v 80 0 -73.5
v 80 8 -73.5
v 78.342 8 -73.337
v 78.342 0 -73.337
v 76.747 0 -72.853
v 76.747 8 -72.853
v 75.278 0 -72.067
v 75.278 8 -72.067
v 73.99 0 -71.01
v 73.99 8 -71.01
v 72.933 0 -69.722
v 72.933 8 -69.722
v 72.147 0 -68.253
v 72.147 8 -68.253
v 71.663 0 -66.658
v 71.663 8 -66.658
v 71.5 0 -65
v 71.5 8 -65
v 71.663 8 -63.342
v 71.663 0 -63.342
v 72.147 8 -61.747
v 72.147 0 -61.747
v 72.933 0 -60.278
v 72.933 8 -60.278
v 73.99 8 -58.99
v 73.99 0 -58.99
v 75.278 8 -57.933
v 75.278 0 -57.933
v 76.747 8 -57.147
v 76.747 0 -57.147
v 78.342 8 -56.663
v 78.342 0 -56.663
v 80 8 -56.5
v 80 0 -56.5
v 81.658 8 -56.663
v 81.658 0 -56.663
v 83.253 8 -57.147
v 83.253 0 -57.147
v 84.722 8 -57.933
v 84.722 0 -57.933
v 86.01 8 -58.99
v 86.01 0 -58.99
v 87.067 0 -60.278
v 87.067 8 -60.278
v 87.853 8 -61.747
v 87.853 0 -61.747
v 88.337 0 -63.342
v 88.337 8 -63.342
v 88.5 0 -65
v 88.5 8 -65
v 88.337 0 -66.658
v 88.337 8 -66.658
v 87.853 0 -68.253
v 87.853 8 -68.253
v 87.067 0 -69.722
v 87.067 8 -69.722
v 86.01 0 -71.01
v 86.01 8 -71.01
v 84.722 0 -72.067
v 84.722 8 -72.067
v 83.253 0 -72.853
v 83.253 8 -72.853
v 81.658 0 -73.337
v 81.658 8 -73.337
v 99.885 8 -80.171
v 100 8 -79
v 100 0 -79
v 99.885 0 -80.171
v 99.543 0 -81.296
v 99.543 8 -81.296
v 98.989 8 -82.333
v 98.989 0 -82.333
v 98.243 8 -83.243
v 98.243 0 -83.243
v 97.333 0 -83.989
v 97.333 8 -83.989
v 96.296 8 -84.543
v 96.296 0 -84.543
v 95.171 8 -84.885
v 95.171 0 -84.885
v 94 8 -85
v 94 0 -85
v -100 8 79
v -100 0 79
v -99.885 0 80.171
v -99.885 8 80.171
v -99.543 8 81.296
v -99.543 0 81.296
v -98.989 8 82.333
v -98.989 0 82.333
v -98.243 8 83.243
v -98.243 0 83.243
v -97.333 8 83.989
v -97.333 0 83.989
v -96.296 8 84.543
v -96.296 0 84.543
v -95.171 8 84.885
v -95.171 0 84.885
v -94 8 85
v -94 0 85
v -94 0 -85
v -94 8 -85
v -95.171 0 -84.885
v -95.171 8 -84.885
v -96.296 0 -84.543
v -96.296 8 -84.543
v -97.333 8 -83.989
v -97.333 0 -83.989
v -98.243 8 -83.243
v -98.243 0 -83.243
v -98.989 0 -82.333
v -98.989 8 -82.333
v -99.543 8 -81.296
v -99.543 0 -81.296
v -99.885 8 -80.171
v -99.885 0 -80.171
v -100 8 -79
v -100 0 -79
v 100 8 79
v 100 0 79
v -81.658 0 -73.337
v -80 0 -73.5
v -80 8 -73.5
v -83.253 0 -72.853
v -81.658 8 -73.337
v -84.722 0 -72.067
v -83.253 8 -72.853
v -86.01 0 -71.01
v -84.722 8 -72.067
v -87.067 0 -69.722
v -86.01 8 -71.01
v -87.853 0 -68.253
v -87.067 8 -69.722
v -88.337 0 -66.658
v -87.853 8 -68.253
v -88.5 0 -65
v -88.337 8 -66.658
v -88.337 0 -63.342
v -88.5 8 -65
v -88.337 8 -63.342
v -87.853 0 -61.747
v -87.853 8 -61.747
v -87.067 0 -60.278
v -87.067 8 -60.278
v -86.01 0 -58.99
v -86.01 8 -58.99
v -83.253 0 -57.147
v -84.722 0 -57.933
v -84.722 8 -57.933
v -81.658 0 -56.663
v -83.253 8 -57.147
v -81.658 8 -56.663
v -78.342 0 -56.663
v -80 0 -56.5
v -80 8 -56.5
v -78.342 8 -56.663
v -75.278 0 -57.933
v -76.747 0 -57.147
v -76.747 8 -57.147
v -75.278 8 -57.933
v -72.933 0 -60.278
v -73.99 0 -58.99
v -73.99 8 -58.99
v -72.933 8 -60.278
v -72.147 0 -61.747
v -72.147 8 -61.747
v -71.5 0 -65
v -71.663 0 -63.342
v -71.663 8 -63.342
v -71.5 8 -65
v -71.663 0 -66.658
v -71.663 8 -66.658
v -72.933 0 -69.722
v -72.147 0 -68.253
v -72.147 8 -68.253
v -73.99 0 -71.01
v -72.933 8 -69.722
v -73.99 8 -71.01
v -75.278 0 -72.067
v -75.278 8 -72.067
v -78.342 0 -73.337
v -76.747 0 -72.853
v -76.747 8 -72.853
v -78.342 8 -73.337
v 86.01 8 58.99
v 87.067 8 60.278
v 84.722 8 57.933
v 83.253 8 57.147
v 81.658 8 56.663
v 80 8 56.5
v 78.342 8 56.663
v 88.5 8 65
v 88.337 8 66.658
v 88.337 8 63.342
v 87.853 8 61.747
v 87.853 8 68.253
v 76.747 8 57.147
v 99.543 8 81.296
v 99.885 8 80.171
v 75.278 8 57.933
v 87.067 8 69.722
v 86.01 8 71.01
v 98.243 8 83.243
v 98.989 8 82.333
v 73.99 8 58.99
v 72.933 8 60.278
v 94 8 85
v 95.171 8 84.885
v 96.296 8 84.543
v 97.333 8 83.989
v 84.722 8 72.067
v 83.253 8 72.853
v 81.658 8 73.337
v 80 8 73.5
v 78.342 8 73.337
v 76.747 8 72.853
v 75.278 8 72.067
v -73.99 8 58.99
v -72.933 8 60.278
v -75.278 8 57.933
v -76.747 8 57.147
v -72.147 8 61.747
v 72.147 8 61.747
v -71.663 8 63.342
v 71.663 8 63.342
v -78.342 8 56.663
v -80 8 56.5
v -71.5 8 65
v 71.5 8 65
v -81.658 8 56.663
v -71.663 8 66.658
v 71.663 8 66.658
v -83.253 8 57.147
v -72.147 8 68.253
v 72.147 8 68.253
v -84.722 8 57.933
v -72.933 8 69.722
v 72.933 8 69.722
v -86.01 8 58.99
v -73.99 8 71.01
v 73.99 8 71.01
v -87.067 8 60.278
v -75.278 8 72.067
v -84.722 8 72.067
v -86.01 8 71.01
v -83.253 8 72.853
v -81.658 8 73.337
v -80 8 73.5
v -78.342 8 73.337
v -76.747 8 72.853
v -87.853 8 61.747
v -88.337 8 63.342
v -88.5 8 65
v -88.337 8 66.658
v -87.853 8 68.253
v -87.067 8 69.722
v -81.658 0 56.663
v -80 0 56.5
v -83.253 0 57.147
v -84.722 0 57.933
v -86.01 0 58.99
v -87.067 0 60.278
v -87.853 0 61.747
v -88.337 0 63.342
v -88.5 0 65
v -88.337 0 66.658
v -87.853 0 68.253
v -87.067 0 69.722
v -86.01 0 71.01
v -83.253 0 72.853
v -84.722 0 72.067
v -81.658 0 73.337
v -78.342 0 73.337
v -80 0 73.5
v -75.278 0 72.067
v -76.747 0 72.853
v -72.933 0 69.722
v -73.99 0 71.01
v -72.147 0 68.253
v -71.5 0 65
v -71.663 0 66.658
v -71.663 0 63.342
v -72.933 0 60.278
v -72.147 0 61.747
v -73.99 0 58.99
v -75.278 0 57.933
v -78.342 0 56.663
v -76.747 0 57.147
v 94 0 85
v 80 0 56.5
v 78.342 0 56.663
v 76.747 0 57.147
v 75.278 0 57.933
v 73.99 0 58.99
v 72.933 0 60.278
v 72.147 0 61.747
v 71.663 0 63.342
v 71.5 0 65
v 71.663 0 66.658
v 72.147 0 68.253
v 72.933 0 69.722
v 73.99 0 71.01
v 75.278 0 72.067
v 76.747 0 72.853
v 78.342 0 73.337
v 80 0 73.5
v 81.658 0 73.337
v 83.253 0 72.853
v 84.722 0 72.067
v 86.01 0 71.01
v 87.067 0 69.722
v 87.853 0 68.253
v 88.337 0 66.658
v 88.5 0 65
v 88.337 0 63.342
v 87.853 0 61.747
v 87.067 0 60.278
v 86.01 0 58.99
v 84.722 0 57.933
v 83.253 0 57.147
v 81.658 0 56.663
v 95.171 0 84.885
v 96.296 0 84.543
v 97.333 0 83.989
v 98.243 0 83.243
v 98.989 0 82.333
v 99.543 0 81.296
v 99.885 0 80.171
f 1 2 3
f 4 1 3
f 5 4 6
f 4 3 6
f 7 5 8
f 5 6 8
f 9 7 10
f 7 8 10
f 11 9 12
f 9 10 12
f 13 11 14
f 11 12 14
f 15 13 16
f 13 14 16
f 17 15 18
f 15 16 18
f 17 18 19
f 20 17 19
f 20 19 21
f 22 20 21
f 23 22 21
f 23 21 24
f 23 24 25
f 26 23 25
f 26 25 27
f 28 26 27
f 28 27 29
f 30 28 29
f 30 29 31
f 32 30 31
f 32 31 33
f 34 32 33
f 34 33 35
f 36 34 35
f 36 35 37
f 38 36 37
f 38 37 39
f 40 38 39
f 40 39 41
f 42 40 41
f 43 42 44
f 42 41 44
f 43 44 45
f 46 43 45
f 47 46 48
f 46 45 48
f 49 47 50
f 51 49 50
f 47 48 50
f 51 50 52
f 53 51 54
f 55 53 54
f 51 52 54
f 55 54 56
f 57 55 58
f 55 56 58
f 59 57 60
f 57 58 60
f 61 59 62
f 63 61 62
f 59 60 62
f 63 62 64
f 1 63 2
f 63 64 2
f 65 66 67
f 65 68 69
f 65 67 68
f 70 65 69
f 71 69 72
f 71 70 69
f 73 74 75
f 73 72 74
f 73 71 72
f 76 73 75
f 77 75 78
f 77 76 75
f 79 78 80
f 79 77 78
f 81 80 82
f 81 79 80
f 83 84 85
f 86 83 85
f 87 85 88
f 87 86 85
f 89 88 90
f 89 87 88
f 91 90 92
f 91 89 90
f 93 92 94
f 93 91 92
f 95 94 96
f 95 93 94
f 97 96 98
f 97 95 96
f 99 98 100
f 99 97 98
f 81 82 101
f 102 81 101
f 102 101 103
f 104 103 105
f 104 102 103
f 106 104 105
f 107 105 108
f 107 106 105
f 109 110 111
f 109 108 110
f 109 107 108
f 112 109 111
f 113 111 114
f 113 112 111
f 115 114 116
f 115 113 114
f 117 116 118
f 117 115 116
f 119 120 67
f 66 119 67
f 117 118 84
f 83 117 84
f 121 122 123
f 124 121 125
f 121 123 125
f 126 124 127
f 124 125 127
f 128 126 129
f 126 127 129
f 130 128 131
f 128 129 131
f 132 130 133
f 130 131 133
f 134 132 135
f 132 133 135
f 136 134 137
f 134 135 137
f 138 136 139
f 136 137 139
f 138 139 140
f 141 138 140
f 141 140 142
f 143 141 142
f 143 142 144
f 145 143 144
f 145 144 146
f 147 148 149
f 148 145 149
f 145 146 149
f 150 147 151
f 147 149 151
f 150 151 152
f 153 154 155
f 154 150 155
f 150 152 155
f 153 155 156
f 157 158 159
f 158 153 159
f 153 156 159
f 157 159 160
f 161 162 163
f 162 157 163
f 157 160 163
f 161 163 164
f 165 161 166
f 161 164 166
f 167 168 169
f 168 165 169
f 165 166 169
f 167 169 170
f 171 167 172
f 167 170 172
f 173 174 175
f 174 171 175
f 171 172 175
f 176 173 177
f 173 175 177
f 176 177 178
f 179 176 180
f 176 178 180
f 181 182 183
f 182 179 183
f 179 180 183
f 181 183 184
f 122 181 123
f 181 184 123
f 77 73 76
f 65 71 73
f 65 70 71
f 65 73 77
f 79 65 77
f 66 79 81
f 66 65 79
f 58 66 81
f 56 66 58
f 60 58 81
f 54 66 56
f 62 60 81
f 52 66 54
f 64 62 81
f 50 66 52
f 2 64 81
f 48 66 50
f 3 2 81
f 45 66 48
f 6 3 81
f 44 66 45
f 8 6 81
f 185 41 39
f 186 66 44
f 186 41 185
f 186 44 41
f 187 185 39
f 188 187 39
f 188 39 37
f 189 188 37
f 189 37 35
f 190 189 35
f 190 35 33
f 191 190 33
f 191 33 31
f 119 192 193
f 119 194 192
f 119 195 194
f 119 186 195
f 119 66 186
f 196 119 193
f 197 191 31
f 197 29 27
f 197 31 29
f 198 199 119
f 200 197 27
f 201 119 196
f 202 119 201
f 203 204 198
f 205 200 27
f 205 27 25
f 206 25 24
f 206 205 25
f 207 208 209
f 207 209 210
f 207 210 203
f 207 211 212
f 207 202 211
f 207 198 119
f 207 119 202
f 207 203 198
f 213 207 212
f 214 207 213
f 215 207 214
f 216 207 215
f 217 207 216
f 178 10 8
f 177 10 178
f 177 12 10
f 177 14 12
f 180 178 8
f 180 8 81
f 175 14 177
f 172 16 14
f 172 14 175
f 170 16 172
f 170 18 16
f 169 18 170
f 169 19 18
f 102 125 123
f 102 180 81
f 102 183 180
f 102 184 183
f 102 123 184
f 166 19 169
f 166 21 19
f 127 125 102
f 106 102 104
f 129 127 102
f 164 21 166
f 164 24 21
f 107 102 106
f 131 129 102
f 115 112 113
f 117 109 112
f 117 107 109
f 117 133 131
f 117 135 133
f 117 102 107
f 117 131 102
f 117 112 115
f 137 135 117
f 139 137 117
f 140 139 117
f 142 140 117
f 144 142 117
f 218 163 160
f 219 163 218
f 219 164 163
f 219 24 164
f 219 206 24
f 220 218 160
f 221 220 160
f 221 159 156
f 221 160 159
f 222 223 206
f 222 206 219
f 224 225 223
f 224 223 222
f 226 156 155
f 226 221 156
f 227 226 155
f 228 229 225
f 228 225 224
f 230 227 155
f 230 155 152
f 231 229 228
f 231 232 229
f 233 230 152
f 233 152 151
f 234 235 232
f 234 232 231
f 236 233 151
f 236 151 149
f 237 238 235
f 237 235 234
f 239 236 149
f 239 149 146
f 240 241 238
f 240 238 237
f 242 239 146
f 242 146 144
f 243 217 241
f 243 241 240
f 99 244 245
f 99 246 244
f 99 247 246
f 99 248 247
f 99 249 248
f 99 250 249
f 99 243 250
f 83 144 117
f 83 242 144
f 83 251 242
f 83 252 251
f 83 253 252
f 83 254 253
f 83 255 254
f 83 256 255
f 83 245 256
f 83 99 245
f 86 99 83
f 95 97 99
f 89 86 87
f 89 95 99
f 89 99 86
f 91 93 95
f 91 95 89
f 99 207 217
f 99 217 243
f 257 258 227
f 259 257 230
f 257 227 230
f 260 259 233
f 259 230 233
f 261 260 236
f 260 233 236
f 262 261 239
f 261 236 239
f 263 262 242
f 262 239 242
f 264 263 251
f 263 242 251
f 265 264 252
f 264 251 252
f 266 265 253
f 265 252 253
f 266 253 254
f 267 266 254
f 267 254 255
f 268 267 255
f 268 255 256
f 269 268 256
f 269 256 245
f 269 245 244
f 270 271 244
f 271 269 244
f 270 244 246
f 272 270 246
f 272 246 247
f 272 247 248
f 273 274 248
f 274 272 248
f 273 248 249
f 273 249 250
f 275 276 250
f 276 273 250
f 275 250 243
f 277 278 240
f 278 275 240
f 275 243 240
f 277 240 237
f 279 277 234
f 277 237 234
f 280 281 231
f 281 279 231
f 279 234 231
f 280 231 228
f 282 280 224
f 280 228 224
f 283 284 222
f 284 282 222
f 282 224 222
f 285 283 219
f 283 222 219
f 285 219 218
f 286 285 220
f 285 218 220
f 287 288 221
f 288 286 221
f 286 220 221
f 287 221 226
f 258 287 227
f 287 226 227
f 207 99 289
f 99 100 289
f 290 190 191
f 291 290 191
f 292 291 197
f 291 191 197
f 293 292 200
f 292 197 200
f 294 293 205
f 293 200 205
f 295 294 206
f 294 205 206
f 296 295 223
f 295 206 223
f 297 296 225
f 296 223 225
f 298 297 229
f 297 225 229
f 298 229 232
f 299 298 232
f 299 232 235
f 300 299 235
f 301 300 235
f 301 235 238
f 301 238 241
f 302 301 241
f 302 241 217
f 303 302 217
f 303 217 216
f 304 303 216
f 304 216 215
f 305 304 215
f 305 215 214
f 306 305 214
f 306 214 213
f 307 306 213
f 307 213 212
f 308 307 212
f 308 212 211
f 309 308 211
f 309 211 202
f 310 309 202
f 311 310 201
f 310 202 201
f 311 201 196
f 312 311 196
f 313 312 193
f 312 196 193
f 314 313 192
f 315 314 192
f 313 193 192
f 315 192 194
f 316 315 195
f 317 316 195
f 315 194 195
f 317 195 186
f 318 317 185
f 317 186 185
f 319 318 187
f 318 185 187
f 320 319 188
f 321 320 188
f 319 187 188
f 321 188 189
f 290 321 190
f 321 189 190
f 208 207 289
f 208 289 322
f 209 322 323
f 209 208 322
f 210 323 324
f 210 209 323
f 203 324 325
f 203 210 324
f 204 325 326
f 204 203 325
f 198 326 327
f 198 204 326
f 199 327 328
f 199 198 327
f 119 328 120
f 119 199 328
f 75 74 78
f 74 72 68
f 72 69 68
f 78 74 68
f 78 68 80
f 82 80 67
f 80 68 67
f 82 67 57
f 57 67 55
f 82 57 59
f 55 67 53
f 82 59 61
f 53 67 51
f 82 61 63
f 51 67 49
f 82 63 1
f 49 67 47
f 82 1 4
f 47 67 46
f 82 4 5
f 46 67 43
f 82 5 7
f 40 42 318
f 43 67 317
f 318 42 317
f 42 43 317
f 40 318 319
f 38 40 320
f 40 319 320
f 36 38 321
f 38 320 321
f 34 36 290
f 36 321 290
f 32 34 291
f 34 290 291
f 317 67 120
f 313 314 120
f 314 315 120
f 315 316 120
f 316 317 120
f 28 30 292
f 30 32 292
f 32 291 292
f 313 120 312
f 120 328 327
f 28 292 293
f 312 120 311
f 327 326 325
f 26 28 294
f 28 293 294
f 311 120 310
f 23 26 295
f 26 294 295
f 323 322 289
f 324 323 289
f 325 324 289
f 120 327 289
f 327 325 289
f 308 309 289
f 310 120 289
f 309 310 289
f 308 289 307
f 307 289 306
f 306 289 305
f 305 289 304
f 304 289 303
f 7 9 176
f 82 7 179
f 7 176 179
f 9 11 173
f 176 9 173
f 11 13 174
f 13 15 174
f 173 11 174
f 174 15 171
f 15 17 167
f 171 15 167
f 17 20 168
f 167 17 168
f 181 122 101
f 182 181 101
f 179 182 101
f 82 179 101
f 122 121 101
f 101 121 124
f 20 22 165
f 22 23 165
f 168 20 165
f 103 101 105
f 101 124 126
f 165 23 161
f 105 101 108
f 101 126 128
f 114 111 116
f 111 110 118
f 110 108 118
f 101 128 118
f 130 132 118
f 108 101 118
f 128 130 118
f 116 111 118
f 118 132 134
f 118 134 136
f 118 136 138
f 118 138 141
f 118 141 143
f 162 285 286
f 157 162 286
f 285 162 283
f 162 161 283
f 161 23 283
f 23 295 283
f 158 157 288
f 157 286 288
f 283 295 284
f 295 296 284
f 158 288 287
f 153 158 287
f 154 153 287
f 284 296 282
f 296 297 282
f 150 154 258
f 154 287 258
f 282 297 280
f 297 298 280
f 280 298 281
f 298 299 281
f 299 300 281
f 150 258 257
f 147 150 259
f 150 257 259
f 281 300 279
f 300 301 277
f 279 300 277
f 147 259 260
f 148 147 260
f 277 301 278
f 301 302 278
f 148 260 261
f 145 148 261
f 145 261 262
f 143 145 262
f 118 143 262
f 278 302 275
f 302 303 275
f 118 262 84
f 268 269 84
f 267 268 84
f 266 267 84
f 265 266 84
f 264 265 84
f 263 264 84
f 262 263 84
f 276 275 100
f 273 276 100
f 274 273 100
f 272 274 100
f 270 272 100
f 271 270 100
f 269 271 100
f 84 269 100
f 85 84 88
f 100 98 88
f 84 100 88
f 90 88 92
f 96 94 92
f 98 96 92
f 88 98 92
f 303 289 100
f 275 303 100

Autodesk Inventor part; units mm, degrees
ref_plane "YZ Plane" through (0, 0, 0) normal (1, 0, 0) x (0, 1, 0)
ref_plane "XZ Plane" through (0, 0, 0) normal (0, 1, 0) x (-1, 0, 0)
ref_plane "XY Plane" through (0, 0, 0) normal (0, 0, 1) x (1, 0, 0)
sketch "Sketch1" plane through (0, 0, 0) normal (0, 1, 0) x (-1, 0, 0)
  line L0 (100, 85) -> (-100, 85)
  line L1 (-100, 85) -> (-100, -85)
  line L2 (-100, -85) -> (100, -85)
  line L3 (100, -85) -> (100, 85)
  point P0 (0, 0)
  point P1 (0, 85)
  point P2 (100, 0)
  dimension "d0" = 200
  dimension "d1" = 170
extrude "Plate1" add sketch "Sketch1" along normal blind 8
sketch "Sketch2" plane through (0, 0, 0) normal (0, -1, 0) x (1, 0, 0)
  line L0 (80, 65) -> (80, -65) construction
  line L1 (-100, -85) -> (-100, 85) projected
  line L2 (100, 85) -> (100, -85) projected
  point P0 (0, 0)
  point P1 (80, 0)
  point P2 (-100, 0)
  dimension "d10" = 20
  dimension "d12" = 20
hole "Hole1" at (80, 0, 65) at (80, 0, -65) direction (0, 1, 0) diameter 17 end through all
fillet "Corner Round1" radius 6 4 edges at (100, 4, 85) (100, 4, -85) (-100, 4, -85) (-100, 4, 85)
mirror "Mirror1" about plane through (0, 0, 0) normal (1, 0, 0) of "Hole1"
equation "\"d12\" = d10"
equation "\"d8\" = Thickness"
equation "\"d2\" = Thickness"
equation "\"BendRadius\" = Thickness"
equation "\"BendReliefWidth\" = Thickness"
equation "\"BendReliefDepth\" = 0.5 * Thickness"
equation "\"CornerReliefSize\" = 4 * Thickness"
equation "\"MinimumRemnant\" = 2 * Thickness"
equation "\"TransitionRadius\" = BendRadius"
equation "\"JacobiRadiusSize\" = BendRadius"
equation "\"GapSize\" = Thickness"
equation "\"Thickness\" = 8"
properties part number "пластина нижняя соед X16"
